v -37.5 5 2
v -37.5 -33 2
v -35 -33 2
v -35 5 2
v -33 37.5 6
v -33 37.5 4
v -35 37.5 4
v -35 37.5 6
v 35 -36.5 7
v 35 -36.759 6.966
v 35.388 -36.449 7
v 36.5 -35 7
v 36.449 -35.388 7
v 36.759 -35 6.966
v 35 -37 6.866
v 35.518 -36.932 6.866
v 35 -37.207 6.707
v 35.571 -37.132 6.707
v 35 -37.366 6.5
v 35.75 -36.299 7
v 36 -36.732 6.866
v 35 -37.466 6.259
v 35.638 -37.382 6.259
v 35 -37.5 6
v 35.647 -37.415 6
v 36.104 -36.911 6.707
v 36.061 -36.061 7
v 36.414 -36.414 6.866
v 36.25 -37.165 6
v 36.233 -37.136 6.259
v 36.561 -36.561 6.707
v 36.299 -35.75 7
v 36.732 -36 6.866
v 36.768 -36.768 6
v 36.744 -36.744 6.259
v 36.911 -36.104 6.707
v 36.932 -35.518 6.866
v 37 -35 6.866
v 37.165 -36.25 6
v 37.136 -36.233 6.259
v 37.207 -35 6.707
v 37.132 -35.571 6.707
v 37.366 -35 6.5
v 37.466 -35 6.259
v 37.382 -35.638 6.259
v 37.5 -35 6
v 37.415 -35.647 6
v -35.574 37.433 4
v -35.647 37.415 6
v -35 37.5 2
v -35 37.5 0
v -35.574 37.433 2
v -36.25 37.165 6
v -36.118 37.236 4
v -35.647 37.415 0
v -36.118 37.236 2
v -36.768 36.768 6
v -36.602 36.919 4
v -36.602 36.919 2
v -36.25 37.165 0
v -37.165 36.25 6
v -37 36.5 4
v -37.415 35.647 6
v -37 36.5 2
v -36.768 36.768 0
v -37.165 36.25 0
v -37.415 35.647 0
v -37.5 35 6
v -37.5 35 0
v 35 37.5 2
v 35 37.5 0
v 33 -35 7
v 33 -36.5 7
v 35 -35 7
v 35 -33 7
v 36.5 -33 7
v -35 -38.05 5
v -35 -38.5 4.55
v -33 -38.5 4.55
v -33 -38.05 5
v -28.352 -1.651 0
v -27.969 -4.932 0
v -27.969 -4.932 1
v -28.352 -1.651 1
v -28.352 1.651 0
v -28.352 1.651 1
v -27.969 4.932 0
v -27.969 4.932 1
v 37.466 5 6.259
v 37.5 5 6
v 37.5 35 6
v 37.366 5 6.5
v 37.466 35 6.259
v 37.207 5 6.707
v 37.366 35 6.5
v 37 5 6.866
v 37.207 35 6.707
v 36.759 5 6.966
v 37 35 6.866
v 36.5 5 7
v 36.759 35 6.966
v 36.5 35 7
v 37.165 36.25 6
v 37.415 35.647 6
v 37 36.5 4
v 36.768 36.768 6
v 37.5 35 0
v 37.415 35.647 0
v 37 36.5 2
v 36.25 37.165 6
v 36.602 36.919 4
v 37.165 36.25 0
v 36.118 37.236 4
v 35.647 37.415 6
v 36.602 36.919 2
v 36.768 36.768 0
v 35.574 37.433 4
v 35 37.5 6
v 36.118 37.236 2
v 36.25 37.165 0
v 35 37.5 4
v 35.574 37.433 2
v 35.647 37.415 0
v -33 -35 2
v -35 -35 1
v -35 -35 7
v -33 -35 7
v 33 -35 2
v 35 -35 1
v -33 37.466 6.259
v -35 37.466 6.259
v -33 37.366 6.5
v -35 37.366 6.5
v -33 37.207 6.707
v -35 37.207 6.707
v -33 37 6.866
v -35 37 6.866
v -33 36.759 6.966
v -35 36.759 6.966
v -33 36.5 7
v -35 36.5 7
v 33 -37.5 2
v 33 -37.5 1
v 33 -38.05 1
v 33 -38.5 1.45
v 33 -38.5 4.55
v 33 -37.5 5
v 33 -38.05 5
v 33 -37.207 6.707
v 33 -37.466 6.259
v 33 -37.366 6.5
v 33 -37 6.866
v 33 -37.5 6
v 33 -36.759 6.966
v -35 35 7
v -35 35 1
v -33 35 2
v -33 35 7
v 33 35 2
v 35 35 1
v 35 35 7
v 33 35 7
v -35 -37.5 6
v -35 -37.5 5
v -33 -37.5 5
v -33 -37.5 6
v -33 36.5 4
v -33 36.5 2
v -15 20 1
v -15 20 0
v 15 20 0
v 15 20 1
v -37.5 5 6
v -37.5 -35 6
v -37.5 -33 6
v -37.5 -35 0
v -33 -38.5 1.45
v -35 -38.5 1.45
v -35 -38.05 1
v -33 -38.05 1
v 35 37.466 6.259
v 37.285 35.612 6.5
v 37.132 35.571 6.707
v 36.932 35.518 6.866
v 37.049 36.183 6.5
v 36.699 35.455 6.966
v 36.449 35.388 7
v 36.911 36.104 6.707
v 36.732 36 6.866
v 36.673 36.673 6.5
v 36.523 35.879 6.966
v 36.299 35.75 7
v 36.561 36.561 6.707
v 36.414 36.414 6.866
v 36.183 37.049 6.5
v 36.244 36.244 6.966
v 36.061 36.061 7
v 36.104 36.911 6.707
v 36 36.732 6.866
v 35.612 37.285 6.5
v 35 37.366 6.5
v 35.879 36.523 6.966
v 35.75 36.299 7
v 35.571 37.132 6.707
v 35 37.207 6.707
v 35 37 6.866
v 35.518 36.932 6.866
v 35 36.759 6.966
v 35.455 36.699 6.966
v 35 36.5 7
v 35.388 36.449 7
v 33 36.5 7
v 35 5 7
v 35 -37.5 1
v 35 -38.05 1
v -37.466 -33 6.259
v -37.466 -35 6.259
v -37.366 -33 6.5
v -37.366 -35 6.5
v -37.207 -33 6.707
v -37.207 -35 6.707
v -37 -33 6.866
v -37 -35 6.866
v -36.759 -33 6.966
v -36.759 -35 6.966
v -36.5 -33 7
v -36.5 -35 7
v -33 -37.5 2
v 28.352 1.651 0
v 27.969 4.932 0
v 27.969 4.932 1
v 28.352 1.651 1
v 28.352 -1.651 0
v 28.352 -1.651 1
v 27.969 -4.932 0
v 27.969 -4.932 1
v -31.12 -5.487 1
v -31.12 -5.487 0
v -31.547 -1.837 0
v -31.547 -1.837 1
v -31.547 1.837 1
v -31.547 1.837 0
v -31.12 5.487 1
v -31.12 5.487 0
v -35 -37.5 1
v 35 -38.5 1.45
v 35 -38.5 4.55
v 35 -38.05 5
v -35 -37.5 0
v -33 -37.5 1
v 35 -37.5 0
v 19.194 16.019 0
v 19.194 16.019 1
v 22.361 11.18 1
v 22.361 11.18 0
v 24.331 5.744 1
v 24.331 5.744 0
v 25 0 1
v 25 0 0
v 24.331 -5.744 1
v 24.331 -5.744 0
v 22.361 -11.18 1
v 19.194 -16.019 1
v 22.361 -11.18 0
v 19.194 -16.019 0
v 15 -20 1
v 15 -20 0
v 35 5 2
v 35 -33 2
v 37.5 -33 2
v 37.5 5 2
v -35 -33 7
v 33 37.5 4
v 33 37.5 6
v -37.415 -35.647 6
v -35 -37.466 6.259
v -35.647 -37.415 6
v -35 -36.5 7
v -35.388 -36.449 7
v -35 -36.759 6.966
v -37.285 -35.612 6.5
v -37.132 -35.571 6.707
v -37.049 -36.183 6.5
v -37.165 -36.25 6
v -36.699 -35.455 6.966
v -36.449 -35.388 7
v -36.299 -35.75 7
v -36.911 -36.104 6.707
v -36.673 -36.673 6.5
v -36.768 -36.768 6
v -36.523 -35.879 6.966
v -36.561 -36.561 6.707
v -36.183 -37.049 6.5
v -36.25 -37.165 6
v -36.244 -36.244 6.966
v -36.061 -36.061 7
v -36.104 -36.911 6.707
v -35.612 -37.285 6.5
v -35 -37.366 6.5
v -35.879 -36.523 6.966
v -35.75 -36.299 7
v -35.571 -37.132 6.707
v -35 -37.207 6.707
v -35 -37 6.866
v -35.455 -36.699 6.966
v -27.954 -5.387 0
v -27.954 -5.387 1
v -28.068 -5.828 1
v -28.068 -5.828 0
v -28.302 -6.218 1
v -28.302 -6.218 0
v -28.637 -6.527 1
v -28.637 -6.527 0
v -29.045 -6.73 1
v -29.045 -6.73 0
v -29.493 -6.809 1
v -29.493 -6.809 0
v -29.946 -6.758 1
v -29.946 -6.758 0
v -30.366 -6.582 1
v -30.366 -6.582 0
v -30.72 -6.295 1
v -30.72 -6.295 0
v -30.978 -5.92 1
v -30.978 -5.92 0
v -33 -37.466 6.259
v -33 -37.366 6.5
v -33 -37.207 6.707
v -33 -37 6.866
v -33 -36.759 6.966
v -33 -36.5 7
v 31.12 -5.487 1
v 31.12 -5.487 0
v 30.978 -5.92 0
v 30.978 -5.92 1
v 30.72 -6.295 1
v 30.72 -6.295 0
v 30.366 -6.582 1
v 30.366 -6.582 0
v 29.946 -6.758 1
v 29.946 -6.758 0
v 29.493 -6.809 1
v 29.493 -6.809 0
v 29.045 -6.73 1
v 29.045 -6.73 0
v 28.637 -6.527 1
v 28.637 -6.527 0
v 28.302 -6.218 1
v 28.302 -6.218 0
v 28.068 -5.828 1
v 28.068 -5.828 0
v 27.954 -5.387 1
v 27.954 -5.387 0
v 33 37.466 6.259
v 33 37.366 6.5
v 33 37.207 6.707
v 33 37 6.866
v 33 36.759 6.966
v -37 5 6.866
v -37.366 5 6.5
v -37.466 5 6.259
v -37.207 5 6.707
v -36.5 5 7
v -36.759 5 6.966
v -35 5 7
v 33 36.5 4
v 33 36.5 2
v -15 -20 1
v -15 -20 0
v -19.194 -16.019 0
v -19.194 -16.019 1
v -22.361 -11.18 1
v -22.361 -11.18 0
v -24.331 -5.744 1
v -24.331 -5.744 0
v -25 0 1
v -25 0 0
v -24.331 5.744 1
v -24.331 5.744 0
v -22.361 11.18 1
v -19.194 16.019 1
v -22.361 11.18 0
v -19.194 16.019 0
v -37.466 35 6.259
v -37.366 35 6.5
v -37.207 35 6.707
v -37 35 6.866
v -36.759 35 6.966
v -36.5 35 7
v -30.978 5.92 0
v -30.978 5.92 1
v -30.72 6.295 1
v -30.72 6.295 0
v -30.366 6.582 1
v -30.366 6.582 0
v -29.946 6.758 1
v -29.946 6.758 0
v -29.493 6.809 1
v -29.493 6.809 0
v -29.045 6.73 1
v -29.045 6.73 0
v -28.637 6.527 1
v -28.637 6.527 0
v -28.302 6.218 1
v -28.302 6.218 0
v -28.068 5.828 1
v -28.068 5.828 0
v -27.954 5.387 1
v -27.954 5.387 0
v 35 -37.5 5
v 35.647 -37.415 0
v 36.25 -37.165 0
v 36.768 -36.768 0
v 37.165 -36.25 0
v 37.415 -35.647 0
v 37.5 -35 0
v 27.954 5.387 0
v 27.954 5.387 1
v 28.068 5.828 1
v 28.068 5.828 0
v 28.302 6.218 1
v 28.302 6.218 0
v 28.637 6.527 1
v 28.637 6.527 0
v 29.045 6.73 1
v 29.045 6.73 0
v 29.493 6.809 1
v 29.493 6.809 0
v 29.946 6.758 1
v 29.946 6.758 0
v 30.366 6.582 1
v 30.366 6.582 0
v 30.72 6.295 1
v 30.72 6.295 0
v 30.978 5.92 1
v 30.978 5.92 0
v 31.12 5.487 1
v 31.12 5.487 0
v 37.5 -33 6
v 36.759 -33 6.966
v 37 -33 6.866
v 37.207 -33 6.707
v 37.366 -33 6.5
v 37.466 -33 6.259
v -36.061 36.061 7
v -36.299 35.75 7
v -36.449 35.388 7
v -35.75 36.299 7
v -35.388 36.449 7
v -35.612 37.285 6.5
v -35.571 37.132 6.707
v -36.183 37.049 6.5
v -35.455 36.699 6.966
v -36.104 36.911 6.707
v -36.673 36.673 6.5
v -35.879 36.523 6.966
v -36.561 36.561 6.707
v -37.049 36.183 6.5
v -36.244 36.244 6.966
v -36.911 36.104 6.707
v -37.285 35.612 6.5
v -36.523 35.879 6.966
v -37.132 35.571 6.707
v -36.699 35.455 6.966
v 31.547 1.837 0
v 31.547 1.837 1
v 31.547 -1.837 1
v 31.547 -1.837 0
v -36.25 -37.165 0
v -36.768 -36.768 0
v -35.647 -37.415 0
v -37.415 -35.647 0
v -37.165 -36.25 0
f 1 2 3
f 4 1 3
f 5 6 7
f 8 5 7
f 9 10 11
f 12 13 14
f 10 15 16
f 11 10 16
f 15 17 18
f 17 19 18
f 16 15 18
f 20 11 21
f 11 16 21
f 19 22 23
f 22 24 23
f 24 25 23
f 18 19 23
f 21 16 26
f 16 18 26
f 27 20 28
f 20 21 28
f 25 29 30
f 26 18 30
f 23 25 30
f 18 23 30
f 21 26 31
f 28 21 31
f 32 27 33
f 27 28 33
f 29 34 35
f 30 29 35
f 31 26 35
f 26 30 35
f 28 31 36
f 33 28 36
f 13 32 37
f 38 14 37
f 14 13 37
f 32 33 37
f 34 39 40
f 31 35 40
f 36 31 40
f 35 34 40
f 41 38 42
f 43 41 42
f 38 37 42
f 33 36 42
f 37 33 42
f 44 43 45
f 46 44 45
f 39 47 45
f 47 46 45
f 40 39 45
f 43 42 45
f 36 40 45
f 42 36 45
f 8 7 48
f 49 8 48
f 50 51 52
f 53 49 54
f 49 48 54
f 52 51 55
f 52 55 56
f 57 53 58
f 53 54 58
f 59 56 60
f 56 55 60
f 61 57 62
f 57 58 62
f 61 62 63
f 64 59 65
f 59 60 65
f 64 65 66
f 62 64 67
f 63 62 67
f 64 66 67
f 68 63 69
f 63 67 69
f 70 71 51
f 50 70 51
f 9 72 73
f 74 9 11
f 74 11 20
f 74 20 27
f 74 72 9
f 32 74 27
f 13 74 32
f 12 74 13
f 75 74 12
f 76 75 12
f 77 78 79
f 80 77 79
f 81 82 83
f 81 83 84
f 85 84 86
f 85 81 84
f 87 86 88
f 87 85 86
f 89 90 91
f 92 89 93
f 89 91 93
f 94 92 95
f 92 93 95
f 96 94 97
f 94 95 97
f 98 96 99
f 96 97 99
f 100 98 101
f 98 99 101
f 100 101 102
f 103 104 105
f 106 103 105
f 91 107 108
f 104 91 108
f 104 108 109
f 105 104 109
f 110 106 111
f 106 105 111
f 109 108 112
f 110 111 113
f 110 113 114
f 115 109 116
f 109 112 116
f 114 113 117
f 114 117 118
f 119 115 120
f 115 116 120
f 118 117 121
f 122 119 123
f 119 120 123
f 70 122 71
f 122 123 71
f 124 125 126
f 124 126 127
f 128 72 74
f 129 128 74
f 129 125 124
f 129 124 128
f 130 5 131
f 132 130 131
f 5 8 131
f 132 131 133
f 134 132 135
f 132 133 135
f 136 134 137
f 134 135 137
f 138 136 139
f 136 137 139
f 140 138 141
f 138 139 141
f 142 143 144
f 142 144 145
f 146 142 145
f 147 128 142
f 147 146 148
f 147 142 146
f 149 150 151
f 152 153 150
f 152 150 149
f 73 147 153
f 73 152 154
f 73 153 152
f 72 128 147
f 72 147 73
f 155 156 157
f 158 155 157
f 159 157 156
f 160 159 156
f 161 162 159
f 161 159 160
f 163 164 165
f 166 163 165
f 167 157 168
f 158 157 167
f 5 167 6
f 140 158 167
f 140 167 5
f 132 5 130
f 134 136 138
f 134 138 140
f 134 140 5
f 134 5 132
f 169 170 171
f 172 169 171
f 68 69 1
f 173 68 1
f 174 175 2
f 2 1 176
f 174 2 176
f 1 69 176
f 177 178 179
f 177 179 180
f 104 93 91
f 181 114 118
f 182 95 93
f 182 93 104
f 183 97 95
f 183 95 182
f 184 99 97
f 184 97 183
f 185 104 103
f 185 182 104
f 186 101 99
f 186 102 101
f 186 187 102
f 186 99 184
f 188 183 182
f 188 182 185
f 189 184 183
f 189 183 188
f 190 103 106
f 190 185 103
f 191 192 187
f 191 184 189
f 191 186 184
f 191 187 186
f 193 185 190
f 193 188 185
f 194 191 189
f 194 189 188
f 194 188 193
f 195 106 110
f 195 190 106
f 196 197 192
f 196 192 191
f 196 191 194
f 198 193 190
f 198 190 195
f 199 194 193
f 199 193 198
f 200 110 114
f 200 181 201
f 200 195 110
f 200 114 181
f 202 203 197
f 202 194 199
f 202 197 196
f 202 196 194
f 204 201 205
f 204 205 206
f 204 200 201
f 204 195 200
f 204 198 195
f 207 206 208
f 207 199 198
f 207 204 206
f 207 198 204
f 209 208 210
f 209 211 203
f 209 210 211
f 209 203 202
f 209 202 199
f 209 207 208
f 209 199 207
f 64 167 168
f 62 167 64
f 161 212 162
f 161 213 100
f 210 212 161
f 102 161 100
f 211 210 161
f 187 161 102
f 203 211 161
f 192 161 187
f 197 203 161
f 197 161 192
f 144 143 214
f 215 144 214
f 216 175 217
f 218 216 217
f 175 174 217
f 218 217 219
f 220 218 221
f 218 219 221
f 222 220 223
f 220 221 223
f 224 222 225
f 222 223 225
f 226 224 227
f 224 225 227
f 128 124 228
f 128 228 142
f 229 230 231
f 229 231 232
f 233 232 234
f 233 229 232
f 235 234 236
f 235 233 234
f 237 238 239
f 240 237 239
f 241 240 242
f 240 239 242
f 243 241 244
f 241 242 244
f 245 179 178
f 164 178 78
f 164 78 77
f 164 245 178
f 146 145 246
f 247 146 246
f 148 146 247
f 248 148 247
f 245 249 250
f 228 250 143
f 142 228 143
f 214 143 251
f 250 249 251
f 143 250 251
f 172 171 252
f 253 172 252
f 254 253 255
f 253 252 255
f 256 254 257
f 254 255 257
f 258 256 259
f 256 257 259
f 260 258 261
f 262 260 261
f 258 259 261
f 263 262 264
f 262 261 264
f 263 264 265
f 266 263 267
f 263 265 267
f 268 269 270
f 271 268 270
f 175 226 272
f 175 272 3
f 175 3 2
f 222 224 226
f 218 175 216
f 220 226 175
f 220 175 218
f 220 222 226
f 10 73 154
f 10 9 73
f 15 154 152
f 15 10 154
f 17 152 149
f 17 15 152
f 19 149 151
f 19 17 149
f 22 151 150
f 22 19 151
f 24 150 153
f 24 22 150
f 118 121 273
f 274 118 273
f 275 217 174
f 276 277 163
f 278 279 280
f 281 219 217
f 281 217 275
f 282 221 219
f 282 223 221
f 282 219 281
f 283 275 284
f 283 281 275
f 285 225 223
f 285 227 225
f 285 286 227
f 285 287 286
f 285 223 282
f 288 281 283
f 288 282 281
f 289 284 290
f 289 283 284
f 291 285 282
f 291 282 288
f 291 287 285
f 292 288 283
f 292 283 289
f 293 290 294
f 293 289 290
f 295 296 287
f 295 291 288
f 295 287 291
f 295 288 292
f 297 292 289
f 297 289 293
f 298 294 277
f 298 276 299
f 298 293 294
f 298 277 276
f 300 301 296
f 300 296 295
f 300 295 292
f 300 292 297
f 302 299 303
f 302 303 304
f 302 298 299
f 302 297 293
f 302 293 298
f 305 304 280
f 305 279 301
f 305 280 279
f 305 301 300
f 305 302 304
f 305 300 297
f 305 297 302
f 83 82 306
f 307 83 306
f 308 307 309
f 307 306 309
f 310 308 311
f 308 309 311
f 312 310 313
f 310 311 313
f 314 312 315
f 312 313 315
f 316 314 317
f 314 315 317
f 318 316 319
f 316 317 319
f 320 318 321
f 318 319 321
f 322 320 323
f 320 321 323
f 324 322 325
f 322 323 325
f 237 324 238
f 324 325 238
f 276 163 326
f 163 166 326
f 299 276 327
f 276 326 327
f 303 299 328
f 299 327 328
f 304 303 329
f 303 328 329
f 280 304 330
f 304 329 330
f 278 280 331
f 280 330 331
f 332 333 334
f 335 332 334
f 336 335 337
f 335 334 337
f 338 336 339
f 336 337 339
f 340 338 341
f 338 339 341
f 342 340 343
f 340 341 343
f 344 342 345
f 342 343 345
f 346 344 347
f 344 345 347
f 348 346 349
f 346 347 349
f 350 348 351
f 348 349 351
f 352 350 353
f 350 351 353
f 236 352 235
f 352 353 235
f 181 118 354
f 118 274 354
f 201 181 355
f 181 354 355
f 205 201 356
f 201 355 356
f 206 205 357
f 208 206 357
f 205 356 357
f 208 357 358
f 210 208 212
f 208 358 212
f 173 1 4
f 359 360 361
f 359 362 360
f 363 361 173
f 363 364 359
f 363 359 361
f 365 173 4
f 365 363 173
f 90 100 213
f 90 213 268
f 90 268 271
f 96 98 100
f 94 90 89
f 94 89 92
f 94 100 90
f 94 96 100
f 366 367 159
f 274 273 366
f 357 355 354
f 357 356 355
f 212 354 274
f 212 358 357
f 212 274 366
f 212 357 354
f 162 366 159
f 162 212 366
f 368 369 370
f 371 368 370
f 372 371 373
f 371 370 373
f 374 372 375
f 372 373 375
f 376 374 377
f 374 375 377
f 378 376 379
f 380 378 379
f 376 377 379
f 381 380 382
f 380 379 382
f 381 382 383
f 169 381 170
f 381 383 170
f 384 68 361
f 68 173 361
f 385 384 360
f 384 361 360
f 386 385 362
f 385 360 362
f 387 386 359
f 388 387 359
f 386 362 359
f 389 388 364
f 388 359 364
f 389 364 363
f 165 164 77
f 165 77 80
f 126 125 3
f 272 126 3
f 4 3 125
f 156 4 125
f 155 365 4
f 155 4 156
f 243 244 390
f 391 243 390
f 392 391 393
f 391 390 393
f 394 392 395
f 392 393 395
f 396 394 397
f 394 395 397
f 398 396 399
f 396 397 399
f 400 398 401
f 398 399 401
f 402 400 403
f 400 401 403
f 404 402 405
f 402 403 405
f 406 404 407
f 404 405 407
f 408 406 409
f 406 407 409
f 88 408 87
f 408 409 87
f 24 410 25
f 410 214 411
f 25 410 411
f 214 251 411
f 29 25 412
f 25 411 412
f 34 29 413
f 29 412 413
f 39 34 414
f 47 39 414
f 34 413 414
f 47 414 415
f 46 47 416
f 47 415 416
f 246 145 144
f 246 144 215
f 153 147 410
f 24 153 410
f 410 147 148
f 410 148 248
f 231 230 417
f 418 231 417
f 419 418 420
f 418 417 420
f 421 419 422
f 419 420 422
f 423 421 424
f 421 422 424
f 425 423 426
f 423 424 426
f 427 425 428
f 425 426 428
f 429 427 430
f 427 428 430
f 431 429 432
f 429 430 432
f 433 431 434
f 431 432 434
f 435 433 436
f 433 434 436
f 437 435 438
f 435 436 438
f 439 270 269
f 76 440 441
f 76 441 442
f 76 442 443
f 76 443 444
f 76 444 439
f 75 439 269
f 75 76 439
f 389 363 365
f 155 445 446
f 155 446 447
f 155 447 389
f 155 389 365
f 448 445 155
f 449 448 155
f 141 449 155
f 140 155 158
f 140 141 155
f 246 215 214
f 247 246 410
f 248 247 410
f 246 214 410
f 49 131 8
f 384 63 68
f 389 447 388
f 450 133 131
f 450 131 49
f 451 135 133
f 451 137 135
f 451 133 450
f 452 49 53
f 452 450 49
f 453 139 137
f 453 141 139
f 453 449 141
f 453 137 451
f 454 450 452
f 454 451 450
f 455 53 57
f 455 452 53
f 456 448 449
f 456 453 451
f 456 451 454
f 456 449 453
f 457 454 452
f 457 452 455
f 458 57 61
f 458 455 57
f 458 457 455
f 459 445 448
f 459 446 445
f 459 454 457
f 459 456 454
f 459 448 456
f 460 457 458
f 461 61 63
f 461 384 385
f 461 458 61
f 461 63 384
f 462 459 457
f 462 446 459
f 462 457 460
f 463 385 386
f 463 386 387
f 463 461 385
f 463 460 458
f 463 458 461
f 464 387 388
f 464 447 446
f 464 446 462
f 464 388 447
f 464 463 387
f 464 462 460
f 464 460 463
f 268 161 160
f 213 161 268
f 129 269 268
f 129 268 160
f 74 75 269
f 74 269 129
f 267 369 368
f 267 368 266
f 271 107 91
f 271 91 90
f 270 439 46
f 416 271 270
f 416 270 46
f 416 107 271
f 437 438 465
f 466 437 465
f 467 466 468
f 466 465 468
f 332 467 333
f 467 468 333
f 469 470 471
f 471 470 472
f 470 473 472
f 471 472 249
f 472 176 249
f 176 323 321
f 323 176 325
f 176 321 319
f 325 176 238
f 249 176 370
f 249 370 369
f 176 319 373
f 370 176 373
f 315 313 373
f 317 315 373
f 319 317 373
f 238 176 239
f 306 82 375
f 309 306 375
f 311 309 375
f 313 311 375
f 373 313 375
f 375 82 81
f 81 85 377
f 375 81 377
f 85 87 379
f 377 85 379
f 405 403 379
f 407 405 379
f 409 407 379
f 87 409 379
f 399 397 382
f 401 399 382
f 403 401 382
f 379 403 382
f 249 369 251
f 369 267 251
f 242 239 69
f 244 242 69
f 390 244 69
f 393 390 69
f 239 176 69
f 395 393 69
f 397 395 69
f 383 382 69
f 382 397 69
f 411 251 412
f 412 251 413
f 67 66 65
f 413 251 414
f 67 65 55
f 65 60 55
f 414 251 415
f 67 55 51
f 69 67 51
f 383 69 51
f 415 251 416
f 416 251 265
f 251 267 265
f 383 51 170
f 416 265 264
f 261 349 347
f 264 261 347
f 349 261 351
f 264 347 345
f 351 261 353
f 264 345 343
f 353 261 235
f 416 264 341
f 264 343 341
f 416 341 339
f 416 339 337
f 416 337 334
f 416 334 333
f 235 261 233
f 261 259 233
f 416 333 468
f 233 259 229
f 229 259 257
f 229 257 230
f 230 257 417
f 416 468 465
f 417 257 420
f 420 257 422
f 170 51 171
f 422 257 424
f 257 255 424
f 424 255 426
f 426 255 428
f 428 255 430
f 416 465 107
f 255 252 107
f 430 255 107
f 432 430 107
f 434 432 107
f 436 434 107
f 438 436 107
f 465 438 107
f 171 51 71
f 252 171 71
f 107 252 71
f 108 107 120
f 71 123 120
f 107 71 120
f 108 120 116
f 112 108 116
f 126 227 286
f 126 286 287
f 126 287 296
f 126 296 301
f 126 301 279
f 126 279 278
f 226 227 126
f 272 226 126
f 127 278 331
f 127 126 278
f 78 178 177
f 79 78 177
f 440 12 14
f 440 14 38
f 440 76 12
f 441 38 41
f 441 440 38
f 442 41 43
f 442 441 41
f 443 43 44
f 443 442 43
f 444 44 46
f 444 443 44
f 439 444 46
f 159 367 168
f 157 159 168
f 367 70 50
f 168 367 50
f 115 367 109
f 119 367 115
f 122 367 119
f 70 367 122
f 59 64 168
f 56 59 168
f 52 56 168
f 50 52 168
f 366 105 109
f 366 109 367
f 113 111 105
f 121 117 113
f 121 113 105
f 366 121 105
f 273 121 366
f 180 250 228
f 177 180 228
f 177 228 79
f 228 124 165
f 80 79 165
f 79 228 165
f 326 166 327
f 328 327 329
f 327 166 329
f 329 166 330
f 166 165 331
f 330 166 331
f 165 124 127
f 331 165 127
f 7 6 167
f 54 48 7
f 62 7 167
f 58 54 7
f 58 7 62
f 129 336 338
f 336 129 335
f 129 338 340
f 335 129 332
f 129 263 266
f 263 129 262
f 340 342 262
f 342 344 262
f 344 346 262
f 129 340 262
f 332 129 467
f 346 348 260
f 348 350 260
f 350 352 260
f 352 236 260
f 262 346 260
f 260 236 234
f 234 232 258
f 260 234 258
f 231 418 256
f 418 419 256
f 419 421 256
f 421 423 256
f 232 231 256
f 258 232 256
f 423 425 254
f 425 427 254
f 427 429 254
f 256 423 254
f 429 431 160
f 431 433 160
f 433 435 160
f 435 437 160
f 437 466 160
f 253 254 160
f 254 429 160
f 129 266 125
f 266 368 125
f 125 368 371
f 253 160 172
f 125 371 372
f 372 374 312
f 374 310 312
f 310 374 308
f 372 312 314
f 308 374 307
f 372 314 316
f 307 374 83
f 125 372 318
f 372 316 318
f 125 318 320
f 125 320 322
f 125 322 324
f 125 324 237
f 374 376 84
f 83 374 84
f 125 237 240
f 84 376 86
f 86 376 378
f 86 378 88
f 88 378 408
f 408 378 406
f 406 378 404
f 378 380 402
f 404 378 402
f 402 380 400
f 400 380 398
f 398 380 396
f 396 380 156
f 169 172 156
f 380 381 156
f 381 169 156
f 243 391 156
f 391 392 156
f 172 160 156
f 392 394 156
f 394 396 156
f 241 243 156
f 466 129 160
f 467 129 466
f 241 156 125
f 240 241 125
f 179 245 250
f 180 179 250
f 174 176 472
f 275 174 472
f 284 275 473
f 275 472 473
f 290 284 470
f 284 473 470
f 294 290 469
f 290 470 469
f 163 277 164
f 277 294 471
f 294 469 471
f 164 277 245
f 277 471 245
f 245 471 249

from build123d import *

# Parameters (mm, degrees)
PAD003_DEPTH    = 7
POCKET002_DEPTH = 7
POCKET008_DEPTH = 10
POCKET009_DEPTH = 6
SKETCH020_W     = 66
SKETCH020_H     = 2.5
SKETCH020_W_2   = 2.5
SKETCH020_H_2   = 38
PAD009_DEPTH    = 1
SKETCH021_W     = 2
SKETCH021_H     = 4
PAD010_DEPTH    = 1
CHAMFER_SIZE    = 0.45
FILLET001_R     = 1
SKETCH022_W     = 75.000016
SKETCH022_H     = 2
POCKET010_DEPTH = 1


with BuildPart() as part:
    # Sketch006 → Pad003 (new body)
    with BuildSketch(Plane.XY):
        with BuildLine():
            Line((-35, -37.5), (34.999998, -37.5))
            ThreePointArc((34.999998, -37.5), (36.767767, -36.767767), (37.5, -34.999999))
            Line((37.5, 35.000016), (37.5, -34.999999))
            ThreePointArc((37.5, 35.000016), (36.767767, 36.767767), (35.000016, 37.5))
            Line((35.000016, 37.5), (-35, 37.5))
            ThreePointArc((-35, 37.5), (-36.767767, 36.767767), (-37.5, 34.999999))
            Line((-37.5, 34.999999), (-37.5, -35))
            ThreePointArc((-37.5, -35), (-36.767767, -36.767767), (-35, -37.5))
        make_face()
    extrude(amount=PAD003_DEPTH)

    # Sketch007 → Pocket002 (cut)
    with BuildSketch(Plane(origin=(0, 0, 0), x_dir=(1, 0, 0), z_dir=(0, 0, -1))):
        with BuildLine():
            Line((-15, 20), (15, 20))
            ThreePointArc((15, -20), (25, 0), (15, 20))
            Line((-15, -20), (15, -20))
            ThreePointArc((-15, 20), (-25, 0), (-15, -20))
        make_face()
    extrude(amount=-POCKET002_DEPTH, mode=Mode.SUBTRACT)

    # Sketch009 → Pocket008 (cut)
    with BuildSketch(Plane(origin=(0, 0, 0), x_dir=(1, 0, 0), z_dir=(0, 0, -1))):
        with BuildLine():
            ThreePointArc((-27.96854, 4.931608), (-28.4, 0), (-27.96854, -4.931608))
            ThreePointArc((-31.119925, -5.487282), (-29.266396, -6.785138), (-27.96854, -4.931608))
            ThreePointArc((-31.119925, 5.487282), (-31.6, 0), (-31.119925, -5.487282))
            ThreePointArc((-27.96854, 4.931608), (-29.266396, 6.785138), (-31.119925, 5.487282))
        make_face()
        with BuildLine():
            ThreePointArc((27.96854, -4.931608), (28.4, -4e-06), (27.968542, 4.9316))
            ThreePointArc((31.119923, 5.487291), (29.266387, 6.785136), (27.968542, 4.9316))
            ThreePointArc((31.119925, -5.487282), (31.6, 5e-06), (31.119923, 5.487291))
            ThreePointArc((27.96854, -4.931608), (29.266396, -6.785138), (31.119925, -5.487282))
        make_face()
    extrude(amount=-POCKET008_DEPTH, mode=Mode.SUBTRACT)

    # Sketch019 → Pocket009 (cut)
    with BuildSketch(Plane.XY.offset(7)):
        Polygon((35, -35), (33, -35), (33, -37.5), (-33, -37.5), (-33, -35), (-35, -35), (-35, -33), (-37.5, -33), (-37.5, 5), (-35, 5), (-35, 35), (-33, 35), (-33, 37.5), (33, 37.5), (33, 35), (35, 35), (35, 5), (37.5, 5), (37.5, -33), (35, -33), align=None)
    extrude(amount=-POCKET009_DEPTH, mode=Mode.SUBTRACT)

    # Sketch020 → Pad009 (new body)
    with BuildSketch(Plane.XY.offset(1)):
        with Locations((0, -36.25)):
            Rectangle(SKETCH020_W, SKETCH020_H)
        with Locations((36.25, -14)):
            Rectangle(SKETCH020_W_2, SKETCH020_H_2)
        with Locations((0, 36.25)):
            Rectangle(SKETCH020_W, SKETCH020_H)
        with Locations((-36.25, -14)):
            Rectangle(SKETCH020_W_2, SKETCH020_H_2)
    extrude(amount=PAD009_DEPTH)

    # Sketch021 → Pad010 (new body)
    with BuildSketch(Plane.XZ.offset(37.5)):
        with Locations((-34, 3)):
            Rectangle(SKETCH021_W, SKETCH021_H)
        with Locations((34, 3)):
            Rectangle(SKETCH021_W, SKETCH021_H)
    extrude(amount=PAD010_DEPTH)

    # Chamfer
    chamfer_edges = [part.edges().sort_by_distance(p)[0] for p in [
        (-34, -38.5, 5),
        (-34, -38.5, 1),
        (34, -38.5, 5),
        (34, -38.5, 1),
    ]]
    chamfer(chamfer_edges, length=CHAMFER_SIZE)

    # Fillet001
    fillet001_edges = [part.edges().sort_by_distance(p)[0] for p in [
        (-37.5, -34, 7),
        (-36.767767, -36.767767, 7),
        (-34, -37.5, 7),
        (33.999999, -37.5, 7),
        (36.767767, -36.767767, 7),
        (37.5, -34, 7),
        (-37.5, 20, 7),
        (-36.767767, 36.767767, 7),
        (-34, 37.5, 7),
        (34.000008, 37.5, 7),
        (36.767767, 36.767767, 7),
        (37.5, 20.000008, 7),
    ]]
    fillet(fillet001_edges, radius=FILLET001_R)

    # Sketch022 → Pocket010 (cut)
    with BuildSketch(Plane(origin=(0, 37.5, 0), x_dir=(-1, 0, 0), z_dir=(0, 1, 0))):
        with Locations((-8e-06, 3)):
            Rectangle(SKETCH022_W, SKETCH022_H)
    extrude(amount=-POCKET010_DEPTH, mode=Mode.SUBTRACT)


solid = part.part
